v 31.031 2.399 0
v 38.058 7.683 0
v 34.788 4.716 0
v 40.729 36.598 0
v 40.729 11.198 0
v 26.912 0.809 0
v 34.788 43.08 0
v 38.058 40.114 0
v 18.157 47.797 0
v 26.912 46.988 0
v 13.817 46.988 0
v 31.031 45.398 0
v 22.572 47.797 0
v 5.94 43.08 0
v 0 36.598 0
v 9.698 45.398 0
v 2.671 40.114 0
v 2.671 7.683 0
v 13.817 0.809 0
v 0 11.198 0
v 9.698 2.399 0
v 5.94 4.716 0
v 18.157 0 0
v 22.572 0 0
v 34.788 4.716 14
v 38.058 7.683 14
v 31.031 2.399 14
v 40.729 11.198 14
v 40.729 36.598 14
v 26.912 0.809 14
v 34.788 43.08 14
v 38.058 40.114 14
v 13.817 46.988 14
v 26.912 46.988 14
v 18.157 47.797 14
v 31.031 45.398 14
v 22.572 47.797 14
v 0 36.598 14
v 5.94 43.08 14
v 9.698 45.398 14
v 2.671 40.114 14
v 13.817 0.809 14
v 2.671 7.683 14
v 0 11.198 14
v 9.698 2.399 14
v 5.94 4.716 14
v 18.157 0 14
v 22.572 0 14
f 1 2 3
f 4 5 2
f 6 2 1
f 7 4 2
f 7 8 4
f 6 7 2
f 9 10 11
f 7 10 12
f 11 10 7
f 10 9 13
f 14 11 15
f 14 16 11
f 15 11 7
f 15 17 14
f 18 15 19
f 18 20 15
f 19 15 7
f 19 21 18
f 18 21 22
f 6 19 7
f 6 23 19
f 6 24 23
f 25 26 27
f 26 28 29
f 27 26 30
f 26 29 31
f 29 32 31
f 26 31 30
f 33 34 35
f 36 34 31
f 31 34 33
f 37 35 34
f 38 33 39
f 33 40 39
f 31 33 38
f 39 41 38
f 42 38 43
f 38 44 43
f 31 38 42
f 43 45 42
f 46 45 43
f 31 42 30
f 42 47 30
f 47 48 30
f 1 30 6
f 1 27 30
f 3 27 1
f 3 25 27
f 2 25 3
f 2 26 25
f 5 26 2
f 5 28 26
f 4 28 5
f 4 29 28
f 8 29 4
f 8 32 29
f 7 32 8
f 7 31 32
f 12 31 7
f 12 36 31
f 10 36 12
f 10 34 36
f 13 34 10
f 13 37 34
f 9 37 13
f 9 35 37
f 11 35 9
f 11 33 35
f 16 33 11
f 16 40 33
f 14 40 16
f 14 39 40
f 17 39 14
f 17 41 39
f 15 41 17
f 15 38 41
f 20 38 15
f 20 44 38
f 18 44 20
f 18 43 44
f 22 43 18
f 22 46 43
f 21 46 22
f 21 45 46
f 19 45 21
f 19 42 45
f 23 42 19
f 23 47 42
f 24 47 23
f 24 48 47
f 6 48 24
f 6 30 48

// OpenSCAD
$fn = 32;

// ----------------------------------------------------------------------
// Flat adaptor: double_d, 14 mm thick
// ----------------------------------------------------------------------

// --- parameters (mm) ---
profile_height = 14;      // extrusion height
profile_points = 24;      // points of the closed outline

profile = [[40.729, 36.598], [38.058, 40.114], [34.788, 43.08], [31.031, 45.398], [26.912, 46.988], [22.572, 47.797], [18.157, 47.797], [13.817, 46.988], [9.698, 45.398], [5.94, 43.08], [2.671, 40.114], [0, 36.598], [0, 11.198], [2.671, 7.683], [5.94, 4.716], [9.698, 2.399], [13.817, 0.809], [18.157, 0], [22.572, 0], [26.912, 0.809], [31.031, 2.399], [34.788, 4.716], [38.058, 7.683], [40.729, 11.198]];  // single closed polygon, 24 points, counter clockwise

// --- the one profile operation ---
linear_extrude(height = profile_height) polygon(points = profile);
